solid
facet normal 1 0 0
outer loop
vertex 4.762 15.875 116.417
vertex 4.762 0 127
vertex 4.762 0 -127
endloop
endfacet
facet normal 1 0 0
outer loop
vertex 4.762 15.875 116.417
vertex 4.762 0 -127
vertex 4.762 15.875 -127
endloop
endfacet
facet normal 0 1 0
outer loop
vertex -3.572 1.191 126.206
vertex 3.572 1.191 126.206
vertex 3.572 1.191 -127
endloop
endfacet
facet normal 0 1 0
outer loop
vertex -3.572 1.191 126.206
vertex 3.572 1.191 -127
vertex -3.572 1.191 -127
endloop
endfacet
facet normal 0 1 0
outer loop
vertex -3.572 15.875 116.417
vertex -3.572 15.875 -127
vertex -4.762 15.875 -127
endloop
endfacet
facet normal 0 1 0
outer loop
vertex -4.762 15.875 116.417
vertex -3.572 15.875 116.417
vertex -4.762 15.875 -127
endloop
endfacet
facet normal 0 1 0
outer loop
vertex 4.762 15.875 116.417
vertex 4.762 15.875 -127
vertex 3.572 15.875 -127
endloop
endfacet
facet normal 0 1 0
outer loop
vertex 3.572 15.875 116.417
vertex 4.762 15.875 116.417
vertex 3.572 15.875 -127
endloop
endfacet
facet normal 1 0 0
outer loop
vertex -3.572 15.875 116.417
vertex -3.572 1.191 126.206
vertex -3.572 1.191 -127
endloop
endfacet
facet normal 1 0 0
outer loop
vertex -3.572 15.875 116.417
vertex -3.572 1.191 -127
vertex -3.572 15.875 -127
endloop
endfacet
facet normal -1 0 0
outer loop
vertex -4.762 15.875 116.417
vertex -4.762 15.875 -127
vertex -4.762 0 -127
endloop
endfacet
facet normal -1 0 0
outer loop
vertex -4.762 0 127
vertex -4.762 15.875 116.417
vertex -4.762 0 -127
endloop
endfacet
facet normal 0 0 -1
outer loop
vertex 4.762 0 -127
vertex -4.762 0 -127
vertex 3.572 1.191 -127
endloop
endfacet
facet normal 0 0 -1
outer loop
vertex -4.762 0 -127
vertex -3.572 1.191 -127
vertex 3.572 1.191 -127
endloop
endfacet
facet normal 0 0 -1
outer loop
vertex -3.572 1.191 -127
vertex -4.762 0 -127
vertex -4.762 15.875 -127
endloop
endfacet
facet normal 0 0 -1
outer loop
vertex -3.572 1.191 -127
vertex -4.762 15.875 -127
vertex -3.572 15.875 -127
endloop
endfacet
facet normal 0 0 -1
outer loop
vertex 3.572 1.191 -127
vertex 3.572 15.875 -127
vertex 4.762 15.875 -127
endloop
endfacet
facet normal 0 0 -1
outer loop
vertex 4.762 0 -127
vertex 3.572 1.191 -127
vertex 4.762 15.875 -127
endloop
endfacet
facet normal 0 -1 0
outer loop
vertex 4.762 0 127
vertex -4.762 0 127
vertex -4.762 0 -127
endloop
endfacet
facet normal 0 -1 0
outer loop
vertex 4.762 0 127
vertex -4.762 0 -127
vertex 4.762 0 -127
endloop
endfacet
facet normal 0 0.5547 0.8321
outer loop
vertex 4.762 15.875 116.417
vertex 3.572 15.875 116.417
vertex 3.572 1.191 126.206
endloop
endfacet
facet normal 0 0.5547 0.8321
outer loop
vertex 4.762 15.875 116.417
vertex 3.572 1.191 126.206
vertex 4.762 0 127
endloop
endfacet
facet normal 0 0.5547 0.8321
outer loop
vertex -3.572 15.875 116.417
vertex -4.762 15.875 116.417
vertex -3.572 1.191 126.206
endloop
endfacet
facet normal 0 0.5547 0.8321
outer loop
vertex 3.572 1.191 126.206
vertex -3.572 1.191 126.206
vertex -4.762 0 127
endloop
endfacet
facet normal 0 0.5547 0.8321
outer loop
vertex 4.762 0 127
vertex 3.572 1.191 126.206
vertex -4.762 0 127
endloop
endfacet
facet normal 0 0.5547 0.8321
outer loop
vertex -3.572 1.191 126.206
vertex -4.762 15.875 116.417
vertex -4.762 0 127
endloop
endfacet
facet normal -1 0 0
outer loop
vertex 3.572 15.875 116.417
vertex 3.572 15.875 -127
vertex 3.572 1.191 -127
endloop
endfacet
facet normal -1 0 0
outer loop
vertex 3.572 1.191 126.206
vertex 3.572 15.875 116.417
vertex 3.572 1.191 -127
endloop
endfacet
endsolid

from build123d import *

# Parameters (mm, degrees)
BOSS_EXTRUDE1_DEPTH = 127
CUT_EXTRUDE1_DEPTH  = 10.525


with BuildPart() as part:
    # Sketch1 → Boss-Extrude1 (new body, symmetric)
    with BuildSketch(Plane.XY):
        Polygon((-3.571875, 15.875), (-4.7625, 15.875), (-4.7625, 0), (4.7625, 0), (4.7625, 15.875), (3.571875, 15.875), (3.571875, 1.190625), (-3.571875, 1.190625), align=None)
    extrude(amount=BOSS_EXTRUDE1_DEPTH, both=True)

    # Sketch3 → Cut-Extrude1 (cut, through all)
    with BuildSketch(Plane.ZY.offset(4.7625)):
        Polygon((127, 0), (117.610335596, 14.084496606), (106.170739416, 31.243890876), (157.683078153, 12.341977689), align=None)
    extrude(amount=-CUT_EXTRUDE1_DEPTH, mode=Mode.SUBTRACT)


solid = part.part
